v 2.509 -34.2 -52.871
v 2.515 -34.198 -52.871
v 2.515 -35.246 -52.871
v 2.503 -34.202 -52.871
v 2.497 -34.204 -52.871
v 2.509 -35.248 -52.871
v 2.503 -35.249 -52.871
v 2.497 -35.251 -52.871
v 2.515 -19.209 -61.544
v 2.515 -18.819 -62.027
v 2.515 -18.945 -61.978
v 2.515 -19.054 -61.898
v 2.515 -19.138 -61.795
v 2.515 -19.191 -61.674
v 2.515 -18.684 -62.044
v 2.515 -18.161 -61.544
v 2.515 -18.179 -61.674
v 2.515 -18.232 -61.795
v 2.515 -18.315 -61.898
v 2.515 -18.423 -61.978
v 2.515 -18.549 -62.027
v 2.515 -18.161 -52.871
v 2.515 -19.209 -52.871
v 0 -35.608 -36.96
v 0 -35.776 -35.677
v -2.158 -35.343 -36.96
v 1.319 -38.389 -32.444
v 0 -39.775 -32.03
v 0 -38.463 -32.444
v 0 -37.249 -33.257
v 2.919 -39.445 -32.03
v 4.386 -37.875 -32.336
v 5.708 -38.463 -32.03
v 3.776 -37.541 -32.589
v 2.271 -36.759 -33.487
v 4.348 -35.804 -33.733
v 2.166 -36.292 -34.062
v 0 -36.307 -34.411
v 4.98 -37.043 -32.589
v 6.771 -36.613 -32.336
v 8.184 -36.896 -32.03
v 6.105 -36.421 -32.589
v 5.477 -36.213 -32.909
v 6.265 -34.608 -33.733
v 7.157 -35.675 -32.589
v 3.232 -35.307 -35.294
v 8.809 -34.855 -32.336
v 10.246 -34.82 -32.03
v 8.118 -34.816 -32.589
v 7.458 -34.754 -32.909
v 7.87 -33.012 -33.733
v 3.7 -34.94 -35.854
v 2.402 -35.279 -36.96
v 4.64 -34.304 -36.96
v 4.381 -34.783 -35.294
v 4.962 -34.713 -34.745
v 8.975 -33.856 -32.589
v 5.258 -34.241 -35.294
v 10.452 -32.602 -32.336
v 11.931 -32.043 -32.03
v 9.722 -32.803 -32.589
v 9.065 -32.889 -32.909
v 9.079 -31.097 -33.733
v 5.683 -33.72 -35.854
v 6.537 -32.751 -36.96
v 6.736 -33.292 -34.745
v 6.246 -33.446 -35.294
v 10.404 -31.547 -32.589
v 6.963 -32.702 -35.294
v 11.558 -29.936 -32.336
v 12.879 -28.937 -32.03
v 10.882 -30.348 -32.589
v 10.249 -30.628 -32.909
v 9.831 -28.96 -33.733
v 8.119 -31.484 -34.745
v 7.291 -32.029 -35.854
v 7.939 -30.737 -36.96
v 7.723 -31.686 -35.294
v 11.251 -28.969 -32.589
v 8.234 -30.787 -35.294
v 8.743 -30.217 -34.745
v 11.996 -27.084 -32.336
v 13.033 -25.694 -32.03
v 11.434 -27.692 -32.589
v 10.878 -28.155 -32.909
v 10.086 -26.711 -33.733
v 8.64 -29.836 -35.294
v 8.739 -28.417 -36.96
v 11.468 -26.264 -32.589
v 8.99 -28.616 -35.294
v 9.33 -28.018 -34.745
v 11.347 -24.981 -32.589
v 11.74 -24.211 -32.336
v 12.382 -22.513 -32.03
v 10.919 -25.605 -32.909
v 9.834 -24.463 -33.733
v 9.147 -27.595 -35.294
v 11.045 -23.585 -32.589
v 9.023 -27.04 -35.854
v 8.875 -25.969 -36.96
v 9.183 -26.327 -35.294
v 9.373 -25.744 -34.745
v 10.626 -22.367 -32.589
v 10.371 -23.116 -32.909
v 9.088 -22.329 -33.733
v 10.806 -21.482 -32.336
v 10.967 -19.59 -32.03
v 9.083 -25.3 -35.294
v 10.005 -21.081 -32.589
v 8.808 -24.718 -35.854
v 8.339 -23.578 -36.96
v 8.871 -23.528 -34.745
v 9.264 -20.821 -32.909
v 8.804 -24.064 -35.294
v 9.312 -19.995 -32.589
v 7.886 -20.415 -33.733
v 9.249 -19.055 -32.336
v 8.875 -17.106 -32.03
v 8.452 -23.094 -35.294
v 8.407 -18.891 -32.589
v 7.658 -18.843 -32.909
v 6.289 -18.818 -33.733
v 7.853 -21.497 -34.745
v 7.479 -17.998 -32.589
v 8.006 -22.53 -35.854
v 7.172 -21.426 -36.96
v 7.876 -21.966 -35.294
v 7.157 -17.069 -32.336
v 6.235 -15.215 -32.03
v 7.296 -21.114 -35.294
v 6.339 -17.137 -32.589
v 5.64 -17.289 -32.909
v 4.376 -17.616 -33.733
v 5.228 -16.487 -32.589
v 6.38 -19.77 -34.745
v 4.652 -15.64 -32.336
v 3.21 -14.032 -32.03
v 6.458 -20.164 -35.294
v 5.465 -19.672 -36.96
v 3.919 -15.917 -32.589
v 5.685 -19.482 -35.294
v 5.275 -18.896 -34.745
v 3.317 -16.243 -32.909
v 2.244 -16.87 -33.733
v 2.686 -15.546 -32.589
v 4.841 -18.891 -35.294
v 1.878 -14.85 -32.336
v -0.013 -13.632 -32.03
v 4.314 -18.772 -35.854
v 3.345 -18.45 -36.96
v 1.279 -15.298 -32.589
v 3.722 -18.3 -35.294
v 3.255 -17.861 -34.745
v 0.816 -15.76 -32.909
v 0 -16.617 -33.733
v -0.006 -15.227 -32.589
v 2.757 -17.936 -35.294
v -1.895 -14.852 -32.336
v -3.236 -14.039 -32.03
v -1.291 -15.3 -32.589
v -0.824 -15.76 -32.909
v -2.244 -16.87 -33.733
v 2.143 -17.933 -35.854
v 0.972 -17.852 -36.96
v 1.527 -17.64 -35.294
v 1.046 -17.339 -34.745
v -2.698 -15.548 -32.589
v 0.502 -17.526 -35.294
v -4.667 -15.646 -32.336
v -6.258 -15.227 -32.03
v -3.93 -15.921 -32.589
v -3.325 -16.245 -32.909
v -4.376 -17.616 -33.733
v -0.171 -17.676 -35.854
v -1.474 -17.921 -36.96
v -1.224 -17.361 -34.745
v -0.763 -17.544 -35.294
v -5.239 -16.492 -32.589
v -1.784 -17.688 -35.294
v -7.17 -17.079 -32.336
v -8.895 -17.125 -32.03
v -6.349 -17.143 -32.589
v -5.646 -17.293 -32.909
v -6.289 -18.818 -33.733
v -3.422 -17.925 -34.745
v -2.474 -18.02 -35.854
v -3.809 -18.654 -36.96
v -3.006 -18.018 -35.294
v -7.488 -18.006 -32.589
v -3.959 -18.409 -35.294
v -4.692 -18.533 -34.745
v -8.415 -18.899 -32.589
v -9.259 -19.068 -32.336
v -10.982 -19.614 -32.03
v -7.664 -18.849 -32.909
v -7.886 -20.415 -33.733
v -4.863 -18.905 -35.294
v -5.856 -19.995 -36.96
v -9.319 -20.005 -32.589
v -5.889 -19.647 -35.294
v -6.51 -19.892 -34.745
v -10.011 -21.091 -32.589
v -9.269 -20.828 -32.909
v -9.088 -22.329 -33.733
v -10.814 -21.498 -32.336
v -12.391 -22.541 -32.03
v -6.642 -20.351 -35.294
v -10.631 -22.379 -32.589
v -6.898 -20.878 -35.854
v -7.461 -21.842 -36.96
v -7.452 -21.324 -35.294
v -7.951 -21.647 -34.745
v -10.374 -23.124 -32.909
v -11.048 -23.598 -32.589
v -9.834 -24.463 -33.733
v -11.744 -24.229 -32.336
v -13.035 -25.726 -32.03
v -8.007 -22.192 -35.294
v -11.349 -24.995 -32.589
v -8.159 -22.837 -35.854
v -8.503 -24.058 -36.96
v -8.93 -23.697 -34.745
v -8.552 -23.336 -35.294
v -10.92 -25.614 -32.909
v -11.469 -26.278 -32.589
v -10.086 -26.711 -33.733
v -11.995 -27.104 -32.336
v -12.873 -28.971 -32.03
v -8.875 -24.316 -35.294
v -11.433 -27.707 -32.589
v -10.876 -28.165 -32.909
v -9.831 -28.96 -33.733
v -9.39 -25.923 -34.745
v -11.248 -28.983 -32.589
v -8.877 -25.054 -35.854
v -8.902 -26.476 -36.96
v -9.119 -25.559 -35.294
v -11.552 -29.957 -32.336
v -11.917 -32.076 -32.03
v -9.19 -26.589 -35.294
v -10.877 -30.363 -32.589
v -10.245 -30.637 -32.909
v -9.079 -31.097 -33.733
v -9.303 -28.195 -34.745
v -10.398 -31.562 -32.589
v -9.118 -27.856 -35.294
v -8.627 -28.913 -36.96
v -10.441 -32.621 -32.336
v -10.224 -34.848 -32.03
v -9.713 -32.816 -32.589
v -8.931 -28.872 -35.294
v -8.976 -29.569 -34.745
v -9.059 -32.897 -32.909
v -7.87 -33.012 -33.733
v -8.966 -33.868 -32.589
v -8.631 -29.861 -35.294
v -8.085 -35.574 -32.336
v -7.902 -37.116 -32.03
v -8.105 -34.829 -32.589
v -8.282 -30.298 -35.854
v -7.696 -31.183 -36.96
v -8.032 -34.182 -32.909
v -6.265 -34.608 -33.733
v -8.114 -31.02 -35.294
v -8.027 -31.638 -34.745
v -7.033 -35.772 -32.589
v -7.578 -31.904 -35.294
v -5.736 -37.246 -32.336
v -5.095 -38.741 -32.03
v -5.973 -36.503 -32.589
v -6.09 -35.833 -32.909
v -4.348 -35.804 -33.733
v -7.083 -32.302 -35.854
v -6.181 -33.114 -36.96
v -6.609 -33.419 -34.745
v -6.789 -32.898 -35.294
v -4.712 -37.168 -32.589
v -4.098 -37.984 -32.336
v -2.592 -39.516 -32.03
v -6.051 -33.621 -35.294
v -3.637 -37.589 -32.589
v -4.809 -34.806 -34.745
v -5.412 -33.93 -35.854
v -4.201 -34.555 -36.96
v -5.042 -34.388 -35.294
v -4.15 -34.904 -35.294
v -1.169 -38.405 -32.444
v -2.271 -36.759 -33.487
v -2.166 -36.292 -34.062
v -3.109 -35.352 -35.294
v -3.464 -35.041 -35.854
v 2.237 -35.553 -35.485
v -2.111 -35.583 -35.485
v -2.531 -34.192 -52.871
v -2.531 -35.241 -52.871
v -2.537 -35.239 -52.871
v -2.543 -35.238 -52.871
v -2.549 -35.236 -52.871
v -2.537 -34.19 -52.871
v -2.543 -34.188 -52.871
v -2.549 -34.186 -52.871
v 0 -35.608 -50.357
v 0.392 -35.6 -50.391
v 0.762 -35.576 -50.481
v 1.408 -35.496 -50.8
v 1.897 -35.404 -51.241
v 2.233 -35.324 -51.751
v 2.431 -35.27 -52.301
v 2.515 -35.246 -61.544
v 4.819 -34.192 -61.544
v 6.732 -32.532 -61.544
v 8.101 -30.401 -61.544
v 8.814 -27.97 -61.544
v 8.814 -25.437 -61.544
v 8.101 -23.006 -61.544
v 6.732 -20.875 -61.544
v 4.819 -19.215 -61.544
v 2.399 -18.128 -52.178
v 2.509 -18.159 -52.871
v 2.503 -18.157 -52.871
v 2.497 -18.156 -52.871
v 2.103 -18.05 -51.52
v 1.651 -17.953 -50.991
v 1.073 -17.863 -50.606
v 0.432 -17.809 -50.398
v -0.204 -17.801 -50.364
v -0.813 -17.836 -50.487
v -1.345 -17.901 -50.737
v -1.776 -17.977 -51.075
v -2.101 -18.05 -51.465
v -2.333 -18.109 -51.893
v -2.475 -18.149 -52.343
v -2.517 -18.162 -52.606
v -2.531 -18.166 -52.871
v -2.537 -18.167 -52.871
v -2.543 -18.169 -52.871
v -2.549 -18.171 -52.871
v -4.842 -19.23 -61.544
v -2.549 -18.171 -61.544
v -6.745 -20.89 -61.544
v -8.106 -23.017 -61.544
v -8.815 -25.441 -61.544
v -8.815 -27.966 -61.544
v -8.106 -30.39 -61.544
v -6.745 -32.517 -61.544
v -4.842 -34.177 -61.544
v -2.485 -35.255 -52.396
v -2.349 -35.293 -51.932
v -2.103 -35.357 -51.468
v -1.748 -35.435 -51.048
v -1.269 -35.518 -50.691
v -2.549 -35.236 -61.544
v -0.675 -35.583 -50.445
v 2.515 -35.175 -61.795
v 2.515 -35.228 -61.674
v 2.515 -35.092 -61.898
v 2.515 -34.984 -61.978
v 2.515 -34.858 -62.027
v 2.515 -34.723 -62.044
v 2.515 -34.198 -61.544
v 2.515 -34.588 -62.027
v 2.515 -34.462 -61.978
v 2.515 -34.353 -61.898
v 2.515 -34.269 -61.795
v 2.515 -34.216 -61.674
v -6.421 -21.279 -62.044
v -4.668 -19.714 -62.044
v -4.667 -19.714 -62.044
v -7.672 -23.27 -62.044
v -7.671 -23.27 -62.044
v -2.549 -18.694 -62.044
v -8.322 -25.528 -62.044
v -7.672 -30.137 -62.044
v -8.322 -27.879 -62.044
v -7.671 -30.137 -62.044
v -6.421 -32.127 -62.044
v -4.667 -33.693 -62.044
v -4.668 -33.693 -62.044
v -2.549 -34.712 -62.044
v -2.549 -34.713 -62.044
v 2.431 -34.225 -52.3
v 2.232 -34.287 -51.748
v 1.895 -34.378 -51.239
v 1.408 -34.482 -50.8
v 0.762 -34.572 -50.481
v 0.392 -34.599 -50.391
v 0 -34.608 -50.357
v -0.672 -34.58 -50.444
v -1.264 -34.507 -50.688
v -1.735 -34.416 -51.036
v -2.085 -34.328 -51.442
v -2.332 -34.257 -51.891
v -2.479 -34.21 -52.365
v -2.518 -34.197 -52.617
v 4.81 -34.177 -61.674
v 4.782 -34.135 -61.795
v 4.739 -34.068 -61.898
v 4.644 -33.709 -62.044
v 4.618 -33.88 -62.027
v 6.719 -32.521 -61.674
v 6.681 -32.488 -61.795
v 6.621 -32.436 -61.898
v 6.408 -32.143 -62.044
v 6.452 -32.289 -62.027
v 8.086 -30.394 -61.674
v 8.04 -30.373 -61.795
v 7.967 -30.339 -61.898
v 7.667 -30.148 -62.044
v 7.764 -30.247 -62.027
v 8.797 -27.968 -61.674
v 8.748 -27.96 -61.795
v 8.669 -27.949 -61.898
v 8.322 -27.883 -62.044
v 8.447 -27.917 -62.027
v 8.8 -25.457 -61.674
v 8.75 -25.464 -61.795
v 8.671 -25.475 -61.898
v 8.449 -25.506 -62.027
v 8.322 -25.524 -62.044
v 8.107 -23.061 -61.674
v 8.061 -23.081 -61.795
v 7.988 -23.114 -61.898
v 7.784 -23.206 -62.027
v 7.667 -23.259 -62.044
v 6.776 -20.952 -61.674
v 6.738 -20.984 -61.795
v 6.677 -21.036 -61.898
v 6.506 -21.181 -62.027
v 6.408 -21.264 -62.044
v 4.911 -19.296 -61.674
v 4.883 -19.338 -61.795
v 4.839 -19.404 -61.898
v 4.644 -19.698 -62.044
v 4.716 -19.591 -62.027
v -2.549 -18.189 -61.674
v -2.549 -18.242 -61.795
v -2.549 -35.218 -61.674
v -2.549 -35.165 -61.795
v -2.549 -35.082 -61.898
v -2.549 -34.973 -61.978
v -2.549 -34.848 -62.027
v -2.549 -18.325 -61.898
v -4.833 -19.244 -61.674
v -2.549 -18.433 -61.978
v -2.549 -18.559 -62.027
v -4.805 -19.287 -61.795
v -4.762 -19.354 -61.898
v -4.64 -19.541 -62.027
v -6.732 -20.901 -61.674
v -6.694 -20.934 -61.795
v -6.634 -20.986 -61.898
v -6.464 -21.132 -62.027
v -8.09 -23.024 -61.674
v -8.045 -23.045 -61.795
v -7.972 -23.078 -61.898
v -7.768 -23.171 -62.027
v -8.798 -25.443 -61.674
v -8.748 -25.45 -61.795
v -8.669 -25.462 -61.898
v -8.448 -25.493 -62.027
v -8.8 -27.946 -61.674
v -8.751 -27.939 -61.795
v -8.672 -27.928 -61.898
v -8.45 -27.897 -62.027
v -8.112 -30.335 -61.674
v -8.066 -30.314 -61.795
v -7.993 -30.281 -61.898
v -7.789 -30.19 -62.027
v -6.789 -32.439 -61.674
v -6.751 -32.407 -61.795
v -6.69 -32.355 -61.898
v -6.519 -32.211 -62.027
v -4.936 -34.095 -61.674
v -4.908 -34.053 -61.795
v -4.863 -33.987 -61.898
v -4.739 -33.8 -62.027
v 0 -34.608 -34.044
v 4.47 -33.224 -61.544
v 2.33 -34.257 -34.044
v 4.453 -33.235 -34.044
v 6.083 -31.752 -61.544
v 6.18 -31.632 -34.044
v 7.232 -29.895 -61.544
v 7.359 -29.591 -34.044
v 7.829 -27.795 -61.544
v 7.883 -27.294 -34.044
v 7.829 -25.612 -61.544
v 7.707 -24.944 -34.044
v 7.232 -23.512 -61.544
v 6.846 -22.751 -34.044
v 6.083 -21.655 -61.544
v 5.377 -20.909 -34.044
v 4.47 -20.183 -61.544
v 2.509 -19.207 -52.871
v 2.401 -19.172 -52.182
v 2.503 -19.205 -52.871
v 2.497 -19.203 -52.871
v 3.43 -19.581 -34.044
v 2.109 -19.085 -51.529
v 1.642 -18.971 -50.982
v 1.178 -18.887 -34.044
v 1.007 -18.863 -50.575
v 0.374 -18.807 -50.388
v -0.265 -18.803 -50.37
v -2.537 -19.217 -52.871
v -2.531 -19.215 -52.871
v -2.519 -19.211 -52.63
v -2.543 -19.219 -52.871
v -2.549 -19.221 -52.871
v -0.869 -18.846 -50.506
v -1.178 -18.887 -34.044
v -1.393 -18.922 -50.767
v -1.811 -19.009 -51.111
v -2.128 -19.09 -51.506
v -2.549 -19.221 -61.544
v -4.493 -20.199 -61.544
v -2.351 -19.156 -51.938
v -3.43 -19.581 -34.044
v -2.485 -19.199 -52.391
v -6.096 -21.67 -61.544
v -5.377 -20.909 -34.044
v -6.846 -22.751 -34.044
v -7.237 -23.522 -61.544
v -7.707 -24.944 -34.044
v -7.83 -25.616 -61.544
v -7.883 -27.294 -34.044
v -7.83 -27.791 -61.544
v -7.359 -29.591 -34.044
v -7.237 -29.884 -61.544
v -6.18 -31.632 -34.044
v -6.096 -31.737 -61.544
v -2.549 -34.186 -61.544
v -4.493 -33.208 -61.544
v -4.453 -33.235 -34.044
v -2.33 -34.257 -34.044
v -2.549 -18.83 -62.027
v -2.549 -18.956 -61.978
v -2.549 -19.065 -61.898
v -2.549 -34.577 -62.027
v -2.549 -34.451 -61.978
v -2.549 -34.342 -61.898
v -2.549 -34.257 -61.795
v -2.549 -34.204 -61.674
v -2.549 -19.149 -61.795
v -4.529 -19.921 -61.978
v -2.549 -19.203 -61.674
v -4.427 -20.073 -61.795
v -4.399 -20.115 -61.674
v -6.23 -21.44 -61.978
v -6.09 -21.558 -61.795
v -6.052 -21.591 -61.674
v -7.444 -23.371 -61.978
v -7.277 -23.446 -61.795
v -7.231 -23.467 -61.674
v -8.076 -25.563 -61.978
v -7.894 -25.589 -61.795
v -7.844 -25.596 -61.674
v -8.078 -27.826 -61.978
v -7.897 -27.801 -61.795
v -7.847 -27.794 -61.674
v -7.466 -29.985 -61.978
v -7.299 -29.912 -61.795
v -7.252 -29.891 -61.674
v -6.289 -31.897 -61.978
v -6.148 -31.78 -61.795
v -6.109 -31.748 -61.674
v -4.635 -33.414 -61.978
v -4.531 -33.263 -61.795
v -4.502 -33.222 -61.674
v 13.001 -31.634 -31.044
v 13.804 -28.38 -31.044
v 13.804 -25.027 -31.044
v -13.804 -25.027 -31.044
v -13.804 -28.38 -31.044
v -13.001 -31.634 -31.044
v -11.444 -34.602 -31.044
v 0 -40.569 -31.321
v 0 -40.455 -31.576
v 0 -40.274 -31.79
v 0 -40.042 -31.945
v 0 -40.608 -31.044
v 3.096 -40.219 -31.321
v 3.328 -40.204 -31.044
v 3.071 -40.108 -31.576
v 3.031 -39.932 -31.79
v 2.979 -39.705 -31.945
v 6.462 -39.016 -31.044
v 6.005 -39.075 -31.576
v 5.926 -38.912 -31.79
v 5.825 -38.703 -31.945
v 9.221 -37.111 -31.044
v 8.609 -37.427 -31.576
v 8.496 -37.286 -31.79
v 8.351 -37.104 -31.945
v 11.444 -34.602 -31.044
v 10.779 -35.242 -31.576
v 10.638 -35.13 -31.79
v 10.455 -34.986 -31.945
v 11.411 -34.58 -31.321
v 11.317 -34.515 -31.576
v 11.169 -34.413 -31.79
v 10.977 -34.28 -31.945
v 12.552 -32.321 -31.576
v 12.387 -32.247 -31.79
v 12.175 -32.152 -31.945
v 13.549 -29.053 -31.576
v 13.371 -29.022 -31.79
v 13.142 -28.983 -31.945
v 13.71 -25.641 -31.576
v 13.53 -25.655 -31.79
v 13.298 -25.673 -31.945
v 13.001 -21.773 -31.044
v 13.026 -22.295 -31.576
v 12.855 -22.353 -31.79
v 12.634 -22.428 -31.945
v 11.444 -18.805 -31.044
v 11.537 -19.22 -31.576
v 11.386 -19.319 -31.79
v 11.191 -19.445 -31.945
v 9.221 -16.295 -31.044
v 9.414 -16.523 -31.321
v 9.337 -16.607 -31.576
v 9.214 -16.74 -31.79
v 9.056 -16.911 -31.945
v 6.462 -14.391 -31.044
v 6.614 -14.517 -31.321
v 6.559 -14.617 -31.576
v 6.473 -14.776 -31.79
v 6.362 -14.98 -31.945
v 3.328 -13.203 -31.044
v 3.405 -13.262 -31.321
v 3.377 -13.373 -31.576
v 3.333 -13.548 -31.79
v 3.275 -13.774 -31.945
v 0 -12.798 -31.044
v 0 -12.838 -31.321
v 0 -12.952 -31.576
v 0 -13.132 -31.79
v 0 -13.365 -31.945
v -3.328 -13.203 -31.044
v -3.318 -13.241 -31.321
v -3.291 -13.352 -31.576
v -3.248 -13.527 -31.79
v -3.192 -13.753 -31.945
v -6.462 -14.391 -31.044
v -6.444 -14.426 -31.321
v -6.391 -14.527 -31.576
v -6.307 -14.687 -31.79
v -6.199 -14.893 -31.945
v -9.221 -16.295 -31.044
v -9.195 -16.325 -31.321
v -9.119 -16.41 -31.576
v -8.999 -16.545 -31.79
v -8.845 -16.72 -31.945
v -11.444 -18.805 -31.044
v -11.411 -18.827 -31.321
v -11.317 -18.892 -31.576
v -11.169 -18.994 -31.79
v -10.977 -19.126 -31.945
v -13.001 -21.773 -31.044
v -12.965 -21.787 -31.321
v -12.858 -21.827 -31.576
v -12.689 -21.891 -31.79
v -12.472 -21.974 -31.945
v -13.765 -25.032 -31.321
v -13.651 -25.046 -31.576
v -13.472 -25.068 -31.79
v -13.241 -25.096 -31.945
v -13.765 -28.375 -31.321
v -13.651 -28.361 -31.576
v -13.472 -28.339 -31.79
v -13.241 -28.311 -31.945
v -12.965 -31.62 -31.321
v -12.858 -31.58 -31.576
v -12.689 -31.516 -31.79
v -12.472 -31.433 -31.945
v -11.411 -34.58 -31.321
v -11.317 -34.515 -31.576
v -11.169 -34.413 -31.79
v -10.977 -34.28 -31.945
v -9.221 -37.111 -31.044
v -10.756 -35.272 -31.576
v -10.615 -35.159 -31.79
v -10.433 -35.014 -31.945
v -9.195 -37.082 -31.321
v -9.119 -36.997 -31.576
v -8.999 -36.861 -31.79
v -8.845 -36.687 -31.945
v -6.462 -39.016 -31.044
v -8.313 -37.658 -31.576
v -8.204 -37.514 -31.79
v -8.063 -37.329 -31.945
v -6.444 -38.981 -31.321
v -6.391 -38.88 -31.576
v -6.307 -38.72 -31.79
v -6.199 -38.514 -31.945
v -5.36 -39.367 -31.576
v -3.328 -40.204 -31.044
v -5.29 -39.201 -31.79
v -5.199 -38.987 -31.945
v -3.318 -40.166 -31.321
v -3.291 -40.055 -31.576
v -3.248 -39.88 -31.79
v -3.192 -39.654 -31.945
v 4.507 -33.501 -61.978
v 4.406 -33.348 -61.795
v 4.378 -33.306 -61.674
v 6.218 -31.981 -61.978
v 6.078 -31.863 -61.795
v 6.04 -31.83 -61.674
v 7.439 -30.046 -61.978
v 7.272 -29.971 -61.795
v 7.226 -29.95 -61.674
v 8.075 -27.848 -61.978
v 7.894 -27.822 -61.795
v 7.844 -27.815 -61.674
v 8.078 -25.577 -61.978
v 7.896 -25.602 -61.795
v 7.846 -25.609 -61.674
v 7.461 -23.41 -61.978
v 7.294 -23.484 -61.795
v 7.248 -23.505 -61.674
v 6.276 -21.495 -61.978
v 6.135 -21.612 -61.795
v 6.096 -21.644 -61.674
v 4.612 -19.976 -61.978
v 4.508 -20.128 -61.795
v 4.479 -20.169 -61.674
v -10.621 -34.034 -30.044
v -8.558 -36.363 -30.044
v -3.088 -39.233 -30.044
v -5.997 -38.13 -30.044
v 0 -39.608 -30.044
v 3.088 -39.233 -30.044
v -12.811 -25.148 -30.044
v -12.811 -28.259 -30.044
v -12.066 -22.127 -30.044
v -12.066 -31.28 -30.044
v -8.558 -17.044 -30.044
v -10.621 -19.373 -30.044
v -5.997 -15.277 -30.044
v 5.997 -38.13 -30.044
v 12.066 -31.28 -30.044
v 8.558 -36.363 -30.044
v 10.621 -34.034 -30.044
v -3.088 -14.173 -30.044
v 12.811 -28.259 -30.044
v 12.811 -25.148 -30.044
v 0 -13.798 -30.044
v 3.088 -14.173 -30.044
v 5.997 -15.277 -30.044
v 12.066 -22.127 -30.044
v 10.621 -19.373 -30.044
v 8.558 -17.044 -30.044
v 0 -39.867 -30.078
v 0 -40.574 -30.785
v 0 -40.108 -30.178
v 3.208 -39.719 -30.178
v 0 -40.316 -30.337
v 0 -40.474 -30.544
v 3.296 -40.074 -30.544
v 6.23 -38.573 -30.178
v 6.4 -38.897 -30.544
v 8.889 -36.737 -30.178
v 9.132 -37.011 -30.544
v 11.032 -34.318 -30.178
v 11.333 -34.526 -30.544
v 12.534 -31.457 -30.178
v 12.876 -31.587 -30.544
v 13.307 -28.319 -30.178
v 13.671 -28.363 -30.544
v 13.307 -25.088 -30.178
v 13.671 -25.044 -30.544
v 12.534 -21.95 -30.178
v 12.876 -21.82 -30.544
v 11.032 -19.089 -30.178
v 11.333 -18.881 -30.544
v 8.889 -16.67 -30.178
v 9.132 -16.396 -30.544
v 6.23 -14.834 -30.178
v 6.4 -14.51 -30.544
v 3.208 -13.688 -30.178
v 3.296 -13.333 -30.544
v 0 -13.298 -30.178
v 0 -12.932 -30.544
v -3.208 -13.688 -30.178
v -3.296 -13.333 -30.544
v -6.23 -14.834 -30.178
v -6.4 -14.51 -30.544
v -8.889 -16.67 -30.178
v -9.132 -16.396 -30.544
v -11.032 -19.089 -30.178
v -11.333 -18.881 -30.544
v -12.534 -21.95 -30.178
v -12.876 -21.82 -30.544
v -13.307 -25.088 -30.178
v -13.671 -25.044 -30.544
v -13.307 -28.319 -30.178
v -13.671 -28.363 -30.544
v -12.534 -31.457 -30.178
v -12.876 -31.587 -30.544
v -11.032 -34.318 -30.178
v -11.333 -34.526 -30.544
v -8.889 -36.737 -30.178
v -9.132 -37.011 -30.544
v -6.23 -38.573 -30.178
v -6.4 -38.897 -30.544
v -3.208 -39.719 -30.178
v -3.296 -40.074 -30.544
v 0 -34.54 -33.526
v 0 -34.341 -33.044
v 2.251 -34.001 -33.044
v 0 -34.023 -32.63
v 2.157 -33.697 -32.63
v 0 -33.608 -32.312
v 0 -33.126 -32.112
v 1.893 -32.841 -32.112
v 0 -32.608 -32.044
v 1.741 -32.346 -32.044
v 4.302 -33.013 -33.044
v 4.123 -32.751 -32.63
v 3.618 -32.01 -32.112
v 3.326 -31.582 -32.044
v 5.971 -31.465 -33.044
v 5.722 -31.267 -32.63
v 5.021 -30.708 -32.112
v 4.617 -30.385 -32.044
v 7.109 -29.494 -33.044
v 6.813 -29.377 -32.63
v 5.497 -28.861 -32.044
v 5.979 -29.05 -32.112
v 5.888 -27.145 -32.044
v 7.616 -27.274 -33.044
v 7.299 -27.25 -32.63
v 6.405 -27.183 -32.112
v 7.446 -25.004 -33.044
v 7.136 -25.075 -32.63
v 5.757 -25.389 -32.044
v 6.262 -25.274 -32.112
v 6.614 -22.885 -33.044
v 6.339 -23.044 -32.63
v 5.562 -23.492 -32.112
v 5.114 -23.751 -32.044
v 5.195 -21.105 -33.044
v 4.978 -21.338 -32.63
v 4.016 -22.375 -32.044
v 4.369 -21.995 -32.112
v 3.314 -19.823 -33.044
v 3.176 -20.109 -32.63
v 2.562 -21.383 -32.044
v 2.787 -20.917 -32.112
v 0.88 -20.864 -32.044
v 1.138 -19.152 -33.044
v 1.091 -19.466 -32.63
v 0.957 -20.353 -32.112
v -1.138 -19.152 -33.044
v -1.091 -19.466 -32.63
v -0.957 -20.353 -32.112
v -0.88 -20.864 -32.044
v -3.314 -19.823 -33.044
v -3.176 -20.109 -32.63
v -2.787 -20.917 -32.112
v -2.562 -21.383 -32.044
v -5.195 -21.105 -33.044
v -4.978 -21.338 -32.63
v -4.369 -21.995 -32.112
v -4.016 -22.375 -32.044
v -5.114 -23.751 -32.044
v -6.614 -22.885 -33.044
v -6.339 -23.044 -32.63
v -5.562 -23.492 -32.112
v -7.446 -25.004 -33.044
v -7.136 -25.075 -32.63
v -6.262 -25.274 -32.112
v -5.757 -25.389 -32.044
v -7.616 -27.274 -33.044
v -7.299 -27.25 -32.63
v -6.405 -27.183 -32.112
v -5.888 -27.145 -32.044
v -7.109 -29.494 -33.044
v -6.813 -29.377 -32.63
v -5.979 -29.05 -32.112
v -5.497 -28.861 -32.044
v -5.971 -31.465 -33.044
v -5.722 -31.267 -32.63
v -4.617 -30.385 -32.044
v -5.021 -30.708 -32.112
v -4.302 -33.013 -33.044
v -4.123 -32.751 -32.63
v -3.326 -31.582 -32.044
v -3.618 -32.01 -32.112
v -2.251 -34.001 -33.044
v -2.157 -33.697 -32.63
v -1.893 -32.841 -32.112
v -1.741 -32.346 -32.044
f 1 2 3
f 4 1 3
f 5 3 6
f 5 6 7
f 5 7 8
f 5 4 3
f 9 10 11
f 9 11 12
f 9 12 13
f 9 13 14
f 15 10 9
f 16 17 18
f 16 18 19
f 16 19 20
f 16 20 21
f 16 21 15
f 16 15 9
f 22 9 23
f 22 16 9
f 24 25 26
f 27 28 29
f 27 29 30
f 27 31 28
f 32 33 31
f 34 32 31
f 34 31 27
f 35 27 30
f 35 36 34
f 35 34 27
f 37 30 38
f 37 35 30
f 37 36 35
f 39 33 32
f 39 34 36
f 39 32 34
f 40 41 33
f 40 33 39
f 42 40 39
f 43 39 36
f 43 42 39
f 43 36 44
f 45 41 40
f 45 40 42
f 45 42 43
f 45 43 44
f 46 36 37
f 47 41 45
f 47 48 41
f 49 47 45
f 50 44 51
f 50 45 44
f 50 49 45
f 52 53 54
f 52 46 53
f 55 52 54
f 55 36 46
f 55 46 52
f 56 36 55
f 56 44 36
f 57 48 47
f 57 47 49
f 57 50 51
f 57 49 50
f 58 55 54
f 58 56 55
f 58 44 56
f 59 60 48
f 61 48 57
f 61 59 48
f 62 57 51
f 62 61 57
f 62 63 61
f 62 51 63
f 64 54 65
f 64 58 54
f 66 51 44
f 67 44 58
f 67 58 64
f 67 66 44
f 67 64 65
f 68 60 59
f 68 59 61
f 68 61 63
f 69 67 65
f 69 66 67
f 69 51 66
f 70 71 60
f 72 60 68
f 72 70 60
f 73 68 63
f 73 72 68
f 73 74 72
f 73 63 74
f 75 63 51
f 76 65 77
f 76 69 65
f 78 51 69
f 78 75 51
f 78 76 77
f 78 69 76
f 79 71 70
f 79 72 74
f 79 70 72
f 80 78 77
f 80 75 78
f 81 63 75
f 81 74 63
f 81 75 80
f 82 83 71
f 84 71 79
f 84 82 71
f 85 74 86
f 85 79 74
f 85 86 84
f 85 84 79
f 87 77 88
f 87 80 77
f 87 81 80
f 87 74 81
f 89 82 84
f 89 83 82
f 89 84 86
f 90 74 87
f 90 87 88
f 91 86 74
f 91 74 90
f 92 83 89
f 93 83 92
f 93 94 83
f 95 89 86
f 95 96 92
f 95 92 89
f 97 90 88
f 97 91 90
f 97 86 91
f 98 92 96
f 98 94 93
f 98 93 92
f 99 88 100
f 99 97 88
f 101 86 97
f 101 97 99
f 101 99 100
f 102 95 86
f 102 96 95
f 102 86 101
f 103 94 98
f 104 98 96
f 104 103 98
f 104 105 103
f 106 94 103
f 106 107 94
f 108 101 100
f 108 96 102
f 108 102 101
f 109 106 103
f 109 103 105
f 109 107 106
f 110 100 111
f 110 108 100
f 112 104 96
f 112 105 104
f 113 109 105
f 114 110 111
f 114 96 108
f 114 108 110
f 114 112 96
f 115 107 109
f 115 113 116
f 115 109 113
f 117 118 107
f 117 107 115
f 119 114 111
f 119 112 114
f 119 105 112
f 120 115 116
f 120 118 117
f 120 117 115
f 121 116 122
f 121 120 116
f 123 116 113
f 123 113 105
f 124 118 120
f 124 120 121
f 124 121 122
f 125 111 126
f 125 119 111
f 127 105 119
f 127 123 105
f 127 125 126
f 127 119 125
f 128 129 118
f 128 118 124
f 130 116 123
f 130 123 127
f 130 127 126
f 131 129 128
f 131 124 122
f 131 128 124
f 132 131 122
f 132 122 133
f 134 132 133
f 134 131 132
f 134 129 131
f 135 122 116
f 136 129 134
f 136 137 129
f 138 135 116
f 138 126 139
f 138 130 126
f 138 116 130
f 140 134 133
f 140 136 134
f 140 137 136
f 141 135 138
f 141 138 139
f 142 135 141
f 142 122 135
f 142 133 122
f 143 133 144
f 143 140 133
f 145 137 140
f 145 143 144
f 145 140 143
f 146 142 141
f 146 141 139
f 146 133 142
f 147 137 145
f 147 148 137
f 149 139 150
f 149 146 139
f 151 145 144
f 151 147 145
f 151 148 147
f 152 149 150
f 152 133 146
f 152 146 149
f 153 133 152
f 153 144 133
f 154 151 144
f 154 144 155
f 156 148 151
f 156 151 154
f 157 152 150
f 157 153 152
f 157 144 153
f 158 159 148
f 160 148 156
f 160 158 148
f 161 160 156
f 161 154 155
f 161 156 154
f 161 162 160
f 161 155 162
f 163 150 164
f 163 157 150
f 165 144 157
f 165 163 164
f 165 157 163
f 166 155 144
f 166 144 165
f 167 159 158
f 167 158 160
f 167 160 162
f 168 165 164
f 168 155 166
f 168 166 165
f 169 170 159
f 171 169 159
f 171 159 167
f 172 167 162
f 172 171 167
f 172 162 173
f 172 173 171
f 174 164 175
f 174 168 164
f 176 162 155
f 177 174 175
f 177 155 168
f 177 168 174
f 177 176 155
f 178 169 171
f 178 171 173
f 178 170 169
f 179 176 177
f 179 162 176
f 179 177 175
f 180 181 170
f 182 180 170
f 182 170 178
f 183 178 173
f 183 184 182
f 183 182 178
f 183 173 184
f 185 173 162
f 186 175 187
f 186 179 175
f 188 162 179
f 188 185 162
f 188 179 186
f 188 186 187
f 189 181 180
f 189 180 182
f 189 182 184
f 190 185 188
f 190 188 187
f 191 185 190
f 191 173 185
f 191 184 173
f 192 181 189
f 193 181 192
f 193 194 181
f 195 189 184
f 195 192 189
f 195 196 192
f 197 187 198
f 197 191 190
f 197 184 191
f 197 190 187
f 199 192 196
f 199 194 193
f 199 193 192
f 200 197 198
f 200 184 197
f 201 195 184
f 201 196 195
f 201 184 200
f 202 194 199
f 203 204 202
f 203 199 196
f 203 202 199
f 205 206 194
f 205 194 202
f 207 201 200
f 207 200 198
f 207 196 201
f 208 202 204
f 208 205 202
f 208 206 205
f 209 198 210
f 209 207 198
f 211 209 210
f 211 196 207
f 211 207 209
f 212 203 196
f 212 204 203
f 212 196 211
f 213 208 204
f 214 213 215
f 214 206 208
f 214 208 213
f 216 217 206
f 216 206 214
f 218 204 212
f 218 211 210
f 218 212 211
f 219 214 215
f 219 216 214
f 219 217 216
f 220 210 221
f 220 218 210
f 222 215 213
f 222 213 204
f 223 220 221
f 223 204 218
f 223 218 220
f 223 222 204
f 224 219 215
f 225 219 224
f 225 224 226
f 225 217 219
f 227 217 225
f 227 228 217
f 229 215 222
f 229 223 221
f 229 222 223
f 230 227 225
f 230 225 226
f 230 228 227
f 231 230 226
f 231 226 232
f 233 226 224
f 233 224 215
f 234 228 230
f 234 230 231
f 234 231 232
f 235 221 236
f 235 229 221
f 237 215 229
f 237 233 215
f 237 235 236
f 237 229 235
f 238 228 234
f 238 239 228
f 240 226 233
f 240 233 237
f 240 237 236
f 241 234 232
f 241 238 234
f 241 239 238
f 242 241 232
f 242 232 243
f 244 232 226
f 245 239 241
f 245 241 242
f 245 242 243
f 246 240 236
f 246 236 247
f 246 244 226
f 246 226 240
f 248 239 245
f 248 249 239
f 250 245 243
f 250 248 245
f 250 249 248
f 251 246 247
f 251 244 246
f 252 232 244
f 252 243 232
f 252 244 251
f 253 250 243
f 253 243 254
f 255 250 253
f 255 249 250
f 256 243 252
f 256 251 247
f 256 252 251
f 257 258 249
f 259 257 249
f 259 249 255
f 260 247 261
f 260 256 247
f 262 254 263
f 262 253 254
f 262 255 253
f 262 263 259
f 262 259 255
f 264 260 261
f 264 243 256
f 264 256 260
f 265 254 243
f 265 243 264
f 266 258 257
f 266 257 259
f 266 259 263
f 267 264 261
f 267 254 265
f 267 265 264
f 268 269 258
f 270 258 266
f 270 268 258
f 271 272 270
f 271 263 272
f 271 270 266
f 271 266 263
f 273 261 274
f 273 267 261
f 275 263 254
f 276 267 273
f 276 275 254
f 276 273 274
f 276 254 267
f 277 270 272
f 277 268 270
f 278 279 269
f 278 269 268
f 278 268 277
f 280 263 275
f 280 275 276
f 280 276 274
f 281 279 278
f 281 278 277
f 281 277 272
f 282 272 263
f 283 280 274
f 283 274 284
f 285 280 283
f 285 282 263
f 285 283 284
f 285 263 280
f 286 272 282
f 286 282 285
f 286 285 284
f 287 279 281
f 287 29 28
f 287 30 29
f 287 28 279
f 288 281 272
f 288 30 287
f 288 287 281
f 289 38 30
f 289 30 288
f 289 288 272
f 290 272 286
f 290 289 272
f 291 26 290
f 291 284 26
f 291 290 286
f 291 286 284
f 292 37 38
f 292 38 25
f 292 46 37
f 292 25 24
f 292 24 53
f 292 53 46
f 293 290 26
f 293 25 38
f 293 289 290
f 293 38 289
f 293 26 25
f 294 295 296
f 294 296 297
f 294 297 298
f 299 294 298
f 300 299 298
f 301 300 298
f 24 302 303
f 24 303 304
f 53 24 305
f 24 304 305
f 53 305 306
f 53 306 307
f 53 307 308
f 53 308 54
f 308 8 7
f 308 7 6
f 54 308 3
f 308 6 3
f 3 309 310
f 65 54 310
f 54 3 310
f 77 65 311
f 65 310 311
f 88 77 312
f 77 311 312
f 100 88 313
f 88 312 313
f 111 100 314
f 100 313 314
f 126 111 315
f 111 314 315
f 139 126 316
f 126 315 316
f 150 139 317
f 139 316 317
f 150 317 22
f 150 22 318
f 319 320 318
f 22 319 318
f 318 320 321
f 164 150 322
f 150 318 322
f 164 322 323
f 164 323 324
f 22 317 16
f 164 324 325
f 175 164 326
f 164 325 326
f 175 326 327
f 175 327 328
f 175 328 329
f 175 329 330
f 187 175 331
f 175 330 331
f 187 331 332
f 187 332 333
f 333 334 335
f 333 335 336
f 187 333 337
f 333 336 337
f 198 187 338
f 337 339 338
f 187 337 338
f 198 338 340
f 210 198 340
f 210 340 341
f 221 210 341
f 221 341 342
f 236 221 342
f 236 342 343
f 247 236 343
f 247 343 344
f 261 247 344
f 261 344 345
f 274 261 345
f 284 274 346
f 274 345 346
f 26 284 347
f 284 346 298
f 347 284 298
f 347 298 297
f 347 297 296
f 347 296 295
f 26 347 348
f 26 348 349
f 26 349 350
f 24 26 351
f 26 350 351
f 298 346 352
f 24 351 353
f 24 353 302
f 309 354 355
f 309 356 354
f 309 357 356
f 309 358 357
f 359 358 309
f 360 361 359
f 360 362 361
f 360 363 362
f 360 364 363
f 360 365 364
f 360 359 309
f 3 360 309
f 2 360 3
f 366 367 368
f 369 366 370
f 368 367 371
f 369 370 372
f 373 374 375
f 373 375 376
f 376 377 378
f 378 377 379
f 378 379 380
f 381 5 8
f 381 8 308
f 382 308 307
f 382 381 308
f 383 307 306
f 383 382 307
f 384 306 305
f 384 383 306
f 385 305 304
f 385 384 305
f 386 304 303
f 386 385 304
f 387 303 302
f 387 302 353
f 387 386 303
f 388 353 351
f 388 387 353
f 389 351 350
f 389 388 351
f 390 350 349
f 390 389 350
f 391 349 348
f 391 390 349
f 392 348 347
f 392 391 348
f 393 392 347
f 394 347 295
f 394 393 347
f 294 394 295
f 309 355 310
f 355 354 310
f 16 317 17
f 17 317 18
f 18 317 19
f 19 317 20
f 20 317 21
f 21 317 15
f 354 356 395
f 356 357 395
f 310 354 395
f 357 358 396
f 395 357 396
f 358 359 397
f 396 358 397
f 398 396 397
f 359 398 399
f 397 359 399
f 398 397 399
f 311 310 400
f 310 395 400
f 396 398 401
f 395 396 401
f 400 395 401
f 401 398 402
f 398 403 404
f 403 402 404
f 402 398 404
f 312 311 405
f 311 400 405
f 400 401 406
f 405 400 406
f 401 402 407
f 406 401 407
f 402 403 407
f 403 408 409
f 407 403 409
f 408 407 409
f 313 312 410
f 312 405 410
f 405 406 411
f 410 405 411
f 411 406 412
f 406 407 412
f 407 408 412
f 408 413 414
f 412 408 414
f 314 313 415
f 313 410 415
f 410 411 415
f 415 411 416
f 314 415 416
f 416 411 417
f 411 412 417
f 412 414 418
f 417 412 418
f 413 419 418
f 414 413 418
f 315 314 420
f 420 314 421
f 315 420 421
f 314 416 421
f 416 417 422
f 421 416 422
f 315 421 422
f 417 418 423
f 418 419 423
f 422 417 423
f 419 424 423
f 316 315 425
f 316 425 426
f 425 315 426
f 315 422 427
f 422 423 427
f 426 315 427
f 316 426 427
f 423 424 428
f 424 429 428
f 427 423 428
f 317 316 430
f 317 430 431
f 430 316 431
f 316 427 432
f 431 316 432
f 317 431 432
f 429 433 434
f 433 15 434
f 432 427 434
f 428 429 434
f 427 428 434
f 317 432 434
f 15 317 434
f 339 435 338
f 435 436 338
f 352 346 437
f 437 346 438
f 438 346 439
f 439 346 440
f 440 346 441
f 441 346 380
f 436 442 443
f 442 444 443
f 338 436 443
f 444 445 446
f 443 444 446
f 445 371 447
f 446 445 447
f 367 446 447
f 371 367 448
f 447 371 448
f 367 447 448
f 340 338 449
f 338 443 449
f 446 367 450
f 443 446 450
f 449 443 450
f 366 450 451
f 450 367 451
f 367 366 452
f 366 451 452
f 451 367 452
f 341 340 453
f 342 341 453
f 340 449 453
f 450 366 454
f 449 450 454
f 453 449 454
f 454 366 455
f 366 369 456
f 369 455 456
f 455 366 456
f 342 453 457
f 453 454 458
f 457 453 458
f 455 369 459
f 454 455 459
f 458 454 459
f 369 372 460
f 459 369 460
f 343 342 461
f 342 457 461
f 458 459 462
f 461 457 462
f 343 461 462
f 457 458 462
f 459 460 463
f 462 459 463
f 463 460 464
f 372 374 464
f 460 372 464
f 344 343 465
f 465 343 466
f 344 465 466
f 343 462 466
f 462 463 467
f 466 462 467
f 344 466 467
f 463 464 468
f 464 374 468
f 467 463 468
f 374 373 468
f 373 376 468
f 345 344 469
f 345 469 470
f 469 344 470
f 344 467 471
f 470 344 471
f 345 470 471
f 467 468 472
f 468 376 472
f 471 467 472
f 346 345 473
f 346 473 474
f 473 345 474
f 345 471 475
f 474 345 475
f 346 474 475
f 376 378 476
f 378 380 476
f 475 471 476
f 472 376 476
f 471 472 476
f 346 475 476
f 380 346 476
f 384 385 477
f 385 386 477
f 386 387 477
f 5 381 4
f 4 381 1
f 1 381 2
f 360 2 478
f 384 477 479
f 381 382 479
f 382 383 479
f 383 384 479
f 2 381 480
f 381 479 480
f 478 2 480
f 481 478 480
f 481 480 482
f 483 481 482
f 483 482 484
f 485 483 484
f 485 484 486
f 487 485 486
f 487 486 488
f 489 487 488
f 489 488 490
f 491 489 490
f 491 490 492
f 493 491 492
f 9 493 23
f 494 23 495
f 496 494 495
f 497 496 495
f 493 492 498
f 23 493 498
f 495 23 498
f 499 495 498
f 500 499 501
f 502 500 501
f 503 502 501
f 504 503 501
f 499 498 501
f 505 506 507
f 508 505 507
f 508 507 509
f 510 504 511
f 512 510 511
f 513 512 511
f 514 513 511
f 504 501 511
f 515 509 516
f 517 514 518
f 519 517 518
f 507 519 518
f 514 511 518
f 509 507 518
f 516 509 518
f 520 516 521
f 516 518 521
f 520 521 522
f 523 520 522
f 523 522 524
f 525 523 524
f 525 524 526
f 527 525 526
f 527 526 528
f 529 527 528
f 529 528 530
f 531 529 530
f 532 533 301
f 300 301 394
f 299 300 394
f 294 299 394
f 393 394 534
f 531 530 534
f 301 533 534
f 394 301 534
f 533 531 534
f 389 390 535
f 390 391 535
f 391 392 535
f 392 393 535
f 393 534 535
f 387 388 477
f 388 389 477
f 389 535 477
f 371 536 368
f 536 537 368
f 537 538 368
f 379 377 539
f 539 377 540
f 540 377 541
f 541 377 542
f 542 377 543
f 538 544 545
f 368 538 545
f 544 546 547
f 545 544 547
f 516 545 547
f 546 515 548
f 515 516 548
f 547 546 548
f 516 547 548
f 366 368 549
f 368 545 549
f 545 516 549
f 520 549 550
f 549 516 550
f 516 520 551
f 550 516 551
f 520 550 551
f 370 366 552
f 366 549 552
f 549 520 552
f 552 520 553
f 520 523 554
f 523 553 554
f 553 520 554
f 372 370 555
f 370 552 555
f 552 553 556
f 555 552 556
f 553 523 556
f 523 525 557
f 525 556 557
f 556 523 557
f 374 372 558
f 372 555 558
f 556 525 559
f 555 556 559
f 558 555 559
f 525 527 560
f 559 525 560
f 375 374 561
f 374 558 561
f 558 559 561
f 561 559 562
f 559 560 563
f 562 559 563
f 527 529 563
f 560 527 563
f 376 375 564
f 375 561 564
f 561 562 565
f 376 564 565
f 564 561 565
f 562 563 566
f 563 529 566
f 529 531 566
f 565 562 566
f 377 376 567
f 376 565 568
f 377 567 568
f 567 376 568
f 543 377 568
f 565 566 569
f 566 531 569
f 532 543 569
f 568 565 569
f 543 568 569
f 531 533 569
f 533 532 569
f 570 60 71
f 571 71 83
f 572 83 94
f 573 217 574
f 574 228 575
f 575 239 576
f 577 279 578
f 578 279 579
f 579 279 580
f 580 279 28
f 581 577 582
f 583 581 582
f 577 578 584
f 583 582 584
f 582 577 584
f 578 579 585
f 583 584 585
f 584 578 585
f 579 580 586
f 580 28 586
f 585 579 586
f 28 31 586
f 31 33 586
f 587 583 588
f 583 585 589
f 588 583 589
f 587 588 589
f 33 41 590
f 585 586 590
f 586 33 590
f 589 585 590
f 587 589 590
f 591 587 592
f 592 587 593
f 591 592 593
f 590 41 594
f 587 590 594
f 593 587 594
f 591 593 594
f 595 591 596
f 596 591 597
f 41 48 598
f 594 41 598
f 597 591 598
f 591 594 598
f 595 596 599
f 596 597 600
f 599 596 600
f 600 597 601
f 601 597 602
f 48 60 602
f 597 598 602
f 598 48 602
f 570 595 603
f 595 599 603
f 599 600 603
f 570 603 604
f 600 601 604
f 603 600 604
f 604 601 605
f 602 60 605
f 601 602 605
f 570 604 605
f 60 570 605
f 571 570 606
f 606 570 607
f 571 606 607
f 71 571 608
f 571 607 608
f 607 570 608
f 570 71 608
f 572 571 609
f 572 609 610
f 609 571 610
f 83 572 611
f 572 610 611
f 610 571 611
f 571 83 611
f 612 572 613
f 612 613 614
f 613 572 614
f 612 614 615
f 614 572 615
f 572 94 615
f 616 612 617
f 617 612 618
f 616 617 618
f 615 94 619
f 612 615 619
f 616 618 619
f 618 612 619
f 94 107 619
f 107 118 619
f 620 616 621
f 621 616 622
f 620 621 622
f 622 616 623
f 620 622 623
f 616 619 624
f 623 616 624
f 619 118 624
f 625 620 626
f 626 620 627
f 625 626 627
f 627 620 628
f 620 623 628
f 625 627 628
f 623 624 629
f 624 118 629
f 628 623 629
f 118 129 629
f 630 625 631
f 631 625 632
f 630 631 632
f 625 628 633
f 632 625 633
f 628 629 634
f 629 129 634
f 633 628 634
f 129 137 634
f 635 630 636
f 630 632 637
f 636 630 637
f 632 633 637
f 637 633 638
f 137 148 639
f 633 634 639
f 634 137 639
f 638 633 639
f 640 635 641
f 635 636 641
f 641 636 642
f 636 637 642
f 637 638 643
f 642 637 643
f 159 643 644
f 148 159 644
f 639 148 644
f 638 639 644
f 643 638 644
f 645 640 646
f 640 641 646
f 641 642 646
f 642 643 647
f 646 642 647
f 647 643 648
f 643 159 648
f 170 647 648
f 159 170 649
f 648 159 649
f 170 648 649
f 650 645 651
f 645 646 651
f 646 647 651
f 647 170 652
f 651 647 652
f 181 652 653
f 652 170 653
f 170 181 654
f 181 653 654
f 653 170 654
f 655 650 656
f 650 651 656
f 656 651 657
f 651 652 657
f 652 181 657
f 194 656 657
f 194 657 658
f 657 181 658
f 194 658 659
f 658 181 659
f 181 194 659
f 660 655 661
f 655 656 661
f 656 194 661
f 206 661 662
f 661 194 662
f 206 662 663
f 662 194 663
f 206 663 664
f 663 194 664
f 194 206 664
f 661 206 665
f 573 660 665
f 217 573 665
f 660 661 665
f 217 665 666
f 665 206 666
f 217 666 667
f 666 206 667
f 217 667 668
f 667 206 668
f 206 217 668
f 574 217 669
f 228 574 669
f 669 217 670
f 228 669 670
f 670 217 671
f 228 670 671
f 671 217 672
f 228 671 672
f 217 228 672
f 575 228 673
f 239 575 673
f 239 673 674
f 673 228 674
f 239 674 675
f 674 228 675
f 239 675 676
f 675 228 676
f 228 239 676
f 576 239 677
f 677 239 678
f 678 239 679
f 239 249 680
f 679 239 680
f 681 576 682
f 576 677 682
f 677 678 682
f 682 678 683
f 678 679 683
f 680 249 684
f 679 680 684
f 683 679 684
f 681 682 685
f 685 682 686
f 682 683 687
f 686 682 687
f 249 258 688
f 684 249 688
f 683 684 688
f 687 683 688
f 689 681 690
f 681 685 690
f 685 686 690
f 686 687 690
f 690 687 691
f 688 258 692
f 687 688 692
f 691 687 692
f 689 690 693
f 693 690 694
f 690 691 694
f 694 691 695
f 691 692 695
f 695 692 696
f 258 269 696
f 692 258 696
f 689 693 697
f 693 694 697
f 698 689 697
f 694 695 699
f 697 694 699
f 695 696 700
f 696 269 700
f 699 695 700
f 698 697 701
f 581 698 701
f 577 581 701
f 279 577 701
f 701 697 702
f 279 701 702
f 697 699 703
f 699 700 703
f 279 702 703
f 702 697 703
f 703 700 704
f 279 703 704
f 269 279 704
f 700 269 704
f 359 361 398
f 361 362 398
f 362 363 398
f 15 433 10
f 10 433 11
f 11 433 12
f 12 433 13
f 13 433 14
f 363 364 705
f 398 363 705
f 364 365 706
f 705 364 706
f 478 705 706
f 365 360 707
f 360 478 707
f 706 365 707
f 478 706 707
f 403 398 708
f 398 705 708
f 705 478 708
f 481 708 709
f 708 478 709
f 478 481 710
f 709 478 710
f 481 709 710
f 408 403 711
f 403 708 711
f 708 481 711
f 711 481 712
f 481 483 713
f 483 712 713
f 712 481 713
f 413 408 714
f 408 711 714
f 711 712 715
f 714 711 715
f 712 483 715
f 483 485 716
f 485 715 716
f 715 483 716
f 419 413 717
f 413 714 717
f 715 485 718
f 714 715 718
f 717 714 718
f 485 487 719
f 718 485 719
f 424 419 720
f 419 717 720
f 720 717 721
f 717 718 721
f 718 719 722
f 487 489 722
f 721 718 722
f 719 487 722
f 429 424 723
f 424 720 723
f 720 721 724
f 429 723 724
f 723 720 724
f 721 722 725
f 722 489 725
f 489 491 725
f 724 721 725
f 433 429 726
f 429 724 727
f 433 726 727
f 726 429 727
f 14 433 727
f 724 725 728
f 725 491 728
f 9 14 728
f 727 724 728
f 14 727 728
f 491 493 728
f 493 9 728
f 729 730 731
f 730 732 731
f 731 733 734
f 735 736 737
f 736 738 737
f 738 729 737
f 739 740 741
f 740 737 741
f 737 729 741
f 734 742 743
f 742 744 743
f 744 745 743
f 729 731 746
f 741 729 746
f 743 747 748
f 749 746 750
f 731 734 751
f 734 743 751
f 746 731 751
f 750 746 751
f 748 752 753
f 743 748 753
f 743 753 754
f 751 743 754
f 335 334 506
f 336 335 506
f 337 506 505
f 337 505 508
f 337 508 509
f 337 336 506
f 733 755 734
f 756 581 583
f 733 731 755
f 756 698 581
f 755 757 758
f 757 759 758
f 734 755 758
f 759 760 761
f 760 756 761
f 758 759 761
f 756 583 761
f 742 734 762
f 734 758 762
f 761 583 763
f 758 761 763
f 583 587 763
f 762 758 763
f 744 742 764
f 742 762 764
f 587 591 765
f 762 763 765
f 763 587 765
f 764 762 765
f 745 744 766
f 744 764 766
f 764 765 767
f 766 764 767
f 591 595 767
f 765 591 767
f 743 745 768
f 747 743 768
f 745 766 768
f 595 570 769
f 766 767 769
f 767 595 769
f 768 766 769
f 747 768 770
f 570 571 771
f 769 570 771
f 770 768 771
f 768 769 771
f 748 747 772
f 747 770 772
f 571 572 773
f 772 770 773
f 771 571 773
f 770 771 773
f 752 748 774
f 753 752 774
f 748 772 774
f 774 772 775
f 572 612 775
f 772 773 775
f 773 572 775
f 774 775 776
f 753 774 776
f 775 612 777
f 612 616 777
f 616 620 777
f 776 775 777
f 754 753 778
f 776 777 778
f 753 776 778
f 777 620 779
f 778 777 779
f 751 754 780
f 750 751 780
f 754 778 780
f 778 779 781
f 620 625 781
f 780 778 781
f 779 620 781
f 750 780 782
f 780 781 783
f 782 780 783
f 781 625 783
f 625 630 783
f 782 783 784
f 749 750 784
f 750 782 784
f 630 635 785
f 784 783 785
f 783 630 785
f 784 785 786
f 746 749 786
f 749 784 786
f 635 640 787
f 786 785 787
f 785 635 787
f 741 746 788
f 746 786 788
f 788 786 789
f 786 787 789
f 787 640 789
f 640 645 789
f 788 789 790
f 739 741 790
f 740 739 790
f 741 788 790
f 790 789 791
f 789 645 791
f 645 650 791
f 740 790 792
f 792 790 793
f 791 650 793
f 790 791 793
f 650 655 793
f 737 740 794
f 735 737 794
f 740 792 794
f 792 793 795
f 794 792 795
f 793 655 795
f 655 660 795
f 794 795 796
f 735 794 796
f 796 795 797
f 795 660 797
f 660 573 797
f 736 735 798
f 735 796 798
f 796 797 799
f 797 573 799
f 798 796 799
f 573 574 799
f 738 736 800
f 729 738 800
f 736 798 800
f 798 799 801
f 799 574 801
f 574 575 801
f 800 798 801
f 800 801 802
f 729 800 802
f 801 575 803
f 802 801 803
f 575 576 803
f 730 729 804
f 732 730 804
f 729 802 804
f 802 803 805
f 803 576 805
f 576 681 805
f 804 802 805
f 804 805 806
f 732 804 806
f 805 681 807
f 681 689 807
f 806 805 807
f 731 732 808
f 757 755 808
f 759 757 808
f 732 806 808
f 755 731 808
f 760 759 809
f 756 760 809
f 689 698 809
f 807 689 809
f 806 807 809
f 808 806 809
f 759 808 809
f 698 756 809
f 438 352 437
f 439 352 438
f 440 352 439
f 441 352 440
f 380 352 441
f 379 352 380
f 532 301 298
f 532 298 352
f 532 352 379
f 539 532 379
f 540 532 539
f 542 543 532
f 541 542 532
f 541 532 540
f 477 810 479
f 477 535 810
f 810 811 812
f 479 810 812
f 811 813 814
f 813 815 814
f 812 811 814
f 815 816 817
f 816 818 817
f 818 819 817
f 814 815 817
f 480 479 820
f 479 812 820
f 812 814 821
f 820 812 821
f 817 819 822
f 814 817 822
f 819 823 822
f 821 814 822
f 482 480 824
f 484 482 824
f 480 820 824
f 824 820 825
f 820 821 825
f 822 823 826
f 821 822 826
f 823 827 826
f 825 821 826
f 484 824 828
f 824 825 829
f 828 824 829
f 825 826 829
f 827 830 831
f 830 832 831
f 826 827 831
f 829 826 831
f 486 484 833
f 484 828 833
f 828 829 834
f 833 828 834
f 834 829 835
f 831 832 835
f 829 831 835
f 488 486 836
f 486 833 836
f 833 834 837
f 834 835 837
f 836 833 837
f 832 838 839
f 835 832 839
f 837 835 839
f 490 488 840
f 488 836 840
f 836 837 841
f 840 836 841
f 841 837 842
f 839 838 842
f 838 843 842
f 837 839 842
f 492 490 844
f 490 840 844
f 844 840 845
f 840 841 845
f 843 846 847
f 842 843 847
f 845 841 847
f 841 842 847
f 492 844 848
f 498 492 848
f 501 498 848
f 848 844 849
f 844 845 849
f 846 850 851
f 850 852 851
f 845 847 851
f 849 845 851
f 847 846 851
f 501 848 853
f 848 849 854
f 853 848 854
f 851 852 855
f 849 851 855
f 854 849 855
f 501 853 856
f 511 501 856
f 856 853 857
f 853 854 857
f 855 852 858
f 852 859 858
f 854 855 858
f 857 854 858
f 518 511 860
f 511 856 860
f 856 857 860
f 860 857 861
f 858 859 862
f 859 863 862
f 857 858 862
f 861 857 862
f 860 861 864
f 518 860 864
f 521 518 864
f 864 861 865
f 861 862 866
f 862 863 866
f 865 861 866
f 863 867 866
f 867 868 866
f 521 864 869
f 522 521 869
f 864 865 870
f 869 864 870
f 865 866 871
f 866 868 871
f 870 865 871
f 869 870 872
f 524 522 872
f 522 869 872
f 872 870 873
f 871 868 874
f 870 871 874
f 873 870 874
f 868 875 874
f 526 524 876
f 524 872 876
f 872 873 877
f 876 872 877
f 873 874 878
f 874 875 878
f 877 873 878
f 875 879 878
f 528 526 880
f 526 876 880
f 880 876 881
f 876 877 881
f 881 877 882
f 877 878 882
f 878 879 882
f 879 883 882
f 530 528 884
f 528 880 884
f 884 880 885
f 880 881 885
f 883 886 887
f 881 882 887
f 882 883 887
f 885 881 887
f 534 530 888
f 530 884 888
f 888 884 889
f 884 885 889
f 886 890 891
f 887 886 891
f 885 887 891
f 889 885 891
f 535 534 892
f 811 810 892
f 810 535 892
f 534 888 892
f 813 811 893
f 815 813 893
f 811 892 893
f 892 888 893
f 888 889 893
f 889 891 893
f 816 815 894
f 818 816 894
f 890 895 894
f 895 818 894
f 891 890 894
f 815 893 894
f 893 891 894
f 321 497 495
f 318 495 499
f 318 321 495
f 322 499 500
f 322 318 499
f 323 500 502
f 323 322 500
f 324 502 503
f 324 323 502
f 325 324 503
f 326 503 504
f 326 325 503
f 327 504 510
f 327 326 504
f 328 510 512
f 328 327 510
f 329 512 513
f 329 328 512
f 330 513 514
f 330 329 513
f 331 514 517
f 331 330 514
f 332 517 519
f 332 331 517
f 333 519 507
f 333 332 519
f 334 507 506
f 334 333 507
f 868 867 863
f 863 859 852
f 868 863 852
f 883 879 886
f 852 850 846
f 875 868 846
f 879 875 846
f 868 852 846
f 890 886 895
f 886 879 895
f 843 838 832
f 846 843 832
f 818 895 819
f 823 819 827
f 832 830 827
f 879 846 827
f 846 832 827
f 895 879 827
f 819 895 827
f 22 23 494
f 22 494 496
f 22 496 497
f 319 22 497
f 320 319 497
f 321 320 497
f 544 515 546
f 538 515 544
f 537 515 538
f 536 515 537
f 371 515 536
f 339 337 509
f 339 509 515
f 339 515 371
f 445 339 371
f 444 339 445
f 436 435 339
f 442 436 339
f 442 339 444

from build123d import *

# Parameters (mm, degrees)
F2_R     = 0.99999
F3_R     = 5
F4_R     = 0.49999
F5_R     = 2.4176485657
F6_DEPTH = 89.5
F7_R     = 2
F9_DEPTH = 39.1


# Not quite as in the source:
# - a fillet or chamfer is up to 0.001 mm smaller than in the source, because OpenCascade refuses the exact size


with BuildPart() as f1:
    # F0 (on Right) → F1 (revolve)
    with BuildSketch(Plane.YZ):
        Polygon((-35.6084575608, -62.0439687319), (-34.6084575608, -62.0439687319), (-34.6084575608, -32.0439687319), (-26.7034575608, -32.0439687319), (-26.7034575608, -30.0439687319), (-40.6084575608, -30.0439687319), (-40.6084575608, -32.0439687319), (-35.6084575608, -32.0439687319), align=None)
    revolve(axis=Axis((0, -26.7034575608, -31.0439687319), (0, 0, 1)))

    # F2 (radius 1 in the source; OpenCascade refuses exactly that, so slightly less here)
    f2_edges = [f1.edges().sort_by_distance(p)[0] for p in [
        (0, -12.798458, -32.043969),
        (0, -12.798458, -30.043969),
    ]]
    fillet(f2_edges, radius=F2_R)

    # F3
    f3_edges = [f1.edges().sort_by_distance(p)[0] for p in [
        (0, -17.798458, -32.043969),
    ]]
    fillet(f3_edges, radius=F3_R)

    # F4 (radius 0.5 in the source; OpenCascade refuses exactly that, so slightly less here)
    f4_edges = [f1.edges().sort_by_distance(p)[0] for p in [
        (0, -18.798458, -62.043969),
        (0, -17.798458, -62.043969),
    ]]
    fillet(f4_edges, radius=F4_R)

    # F5 (on Front) → F6 (cut)
    with BuildSketch(Plane.XZ):
        with Locations((0, -61.6349689662)):
            Circle(F5_R)
    extrude(amount=F6_DEPTH, mode=Mode.SUBTRACT)

    # F7
    f7_edges = [f1.edges().sort_by_distance(p)[0] for p in [
        (0, -18.798458, -32.043969),
    ]]
    fillet(f7_edges, radius=F7_R)

    # F8 (on Front) → F9 (cut)
    with BuildSketch(Plane.XZ):
        with BuildLine():
            Line((-2.5493614376, -52.8711415827), (-2.5493614376, -62.0828643441))
            Line((-2.5493614376, -62.0828643441), (2.5154370815, -62.0695389807))
            Line((2.5154370815, -62.0695389807), (2.5154370815, -52.8711415827))
            Line((2.5154370815, -52.8711415827), (2.4968570896, -52.8711415827))
            ThreePointArc((2.4968570896, -52.8711415827), (-0.0169621781, -55.3849608503), (-2.5307814457, -52.8711415827))
            Line((-2.5307814457, -52.8711415827), (-2.5493614376, -52.8711415827))
        make_face()
        with BuildLine():
            ThreePointArc((2.4968570896, -52.8711415827), (-0.0169621781, -50.3573223151), (-2.5307814457, -52.8711415827))
            Line((-2.5307814457, -52.8711415827), (2.4968570896, -52.8711415827))
        make_face()
        with BuildLine():
            Line((2.4968570896, -52.8711415827), (-2.5307814457, -52.8711415827))
            ThreePointArc((-2.5307814457, -52.8711415827), (-0.0169621781, -55.3849608503), (2.4968570896, -52.8711415827))
        make_face()
    extrude(amount=F9_DEPTH, mode=Mode.SUBTRACT)


solid = f1.part
